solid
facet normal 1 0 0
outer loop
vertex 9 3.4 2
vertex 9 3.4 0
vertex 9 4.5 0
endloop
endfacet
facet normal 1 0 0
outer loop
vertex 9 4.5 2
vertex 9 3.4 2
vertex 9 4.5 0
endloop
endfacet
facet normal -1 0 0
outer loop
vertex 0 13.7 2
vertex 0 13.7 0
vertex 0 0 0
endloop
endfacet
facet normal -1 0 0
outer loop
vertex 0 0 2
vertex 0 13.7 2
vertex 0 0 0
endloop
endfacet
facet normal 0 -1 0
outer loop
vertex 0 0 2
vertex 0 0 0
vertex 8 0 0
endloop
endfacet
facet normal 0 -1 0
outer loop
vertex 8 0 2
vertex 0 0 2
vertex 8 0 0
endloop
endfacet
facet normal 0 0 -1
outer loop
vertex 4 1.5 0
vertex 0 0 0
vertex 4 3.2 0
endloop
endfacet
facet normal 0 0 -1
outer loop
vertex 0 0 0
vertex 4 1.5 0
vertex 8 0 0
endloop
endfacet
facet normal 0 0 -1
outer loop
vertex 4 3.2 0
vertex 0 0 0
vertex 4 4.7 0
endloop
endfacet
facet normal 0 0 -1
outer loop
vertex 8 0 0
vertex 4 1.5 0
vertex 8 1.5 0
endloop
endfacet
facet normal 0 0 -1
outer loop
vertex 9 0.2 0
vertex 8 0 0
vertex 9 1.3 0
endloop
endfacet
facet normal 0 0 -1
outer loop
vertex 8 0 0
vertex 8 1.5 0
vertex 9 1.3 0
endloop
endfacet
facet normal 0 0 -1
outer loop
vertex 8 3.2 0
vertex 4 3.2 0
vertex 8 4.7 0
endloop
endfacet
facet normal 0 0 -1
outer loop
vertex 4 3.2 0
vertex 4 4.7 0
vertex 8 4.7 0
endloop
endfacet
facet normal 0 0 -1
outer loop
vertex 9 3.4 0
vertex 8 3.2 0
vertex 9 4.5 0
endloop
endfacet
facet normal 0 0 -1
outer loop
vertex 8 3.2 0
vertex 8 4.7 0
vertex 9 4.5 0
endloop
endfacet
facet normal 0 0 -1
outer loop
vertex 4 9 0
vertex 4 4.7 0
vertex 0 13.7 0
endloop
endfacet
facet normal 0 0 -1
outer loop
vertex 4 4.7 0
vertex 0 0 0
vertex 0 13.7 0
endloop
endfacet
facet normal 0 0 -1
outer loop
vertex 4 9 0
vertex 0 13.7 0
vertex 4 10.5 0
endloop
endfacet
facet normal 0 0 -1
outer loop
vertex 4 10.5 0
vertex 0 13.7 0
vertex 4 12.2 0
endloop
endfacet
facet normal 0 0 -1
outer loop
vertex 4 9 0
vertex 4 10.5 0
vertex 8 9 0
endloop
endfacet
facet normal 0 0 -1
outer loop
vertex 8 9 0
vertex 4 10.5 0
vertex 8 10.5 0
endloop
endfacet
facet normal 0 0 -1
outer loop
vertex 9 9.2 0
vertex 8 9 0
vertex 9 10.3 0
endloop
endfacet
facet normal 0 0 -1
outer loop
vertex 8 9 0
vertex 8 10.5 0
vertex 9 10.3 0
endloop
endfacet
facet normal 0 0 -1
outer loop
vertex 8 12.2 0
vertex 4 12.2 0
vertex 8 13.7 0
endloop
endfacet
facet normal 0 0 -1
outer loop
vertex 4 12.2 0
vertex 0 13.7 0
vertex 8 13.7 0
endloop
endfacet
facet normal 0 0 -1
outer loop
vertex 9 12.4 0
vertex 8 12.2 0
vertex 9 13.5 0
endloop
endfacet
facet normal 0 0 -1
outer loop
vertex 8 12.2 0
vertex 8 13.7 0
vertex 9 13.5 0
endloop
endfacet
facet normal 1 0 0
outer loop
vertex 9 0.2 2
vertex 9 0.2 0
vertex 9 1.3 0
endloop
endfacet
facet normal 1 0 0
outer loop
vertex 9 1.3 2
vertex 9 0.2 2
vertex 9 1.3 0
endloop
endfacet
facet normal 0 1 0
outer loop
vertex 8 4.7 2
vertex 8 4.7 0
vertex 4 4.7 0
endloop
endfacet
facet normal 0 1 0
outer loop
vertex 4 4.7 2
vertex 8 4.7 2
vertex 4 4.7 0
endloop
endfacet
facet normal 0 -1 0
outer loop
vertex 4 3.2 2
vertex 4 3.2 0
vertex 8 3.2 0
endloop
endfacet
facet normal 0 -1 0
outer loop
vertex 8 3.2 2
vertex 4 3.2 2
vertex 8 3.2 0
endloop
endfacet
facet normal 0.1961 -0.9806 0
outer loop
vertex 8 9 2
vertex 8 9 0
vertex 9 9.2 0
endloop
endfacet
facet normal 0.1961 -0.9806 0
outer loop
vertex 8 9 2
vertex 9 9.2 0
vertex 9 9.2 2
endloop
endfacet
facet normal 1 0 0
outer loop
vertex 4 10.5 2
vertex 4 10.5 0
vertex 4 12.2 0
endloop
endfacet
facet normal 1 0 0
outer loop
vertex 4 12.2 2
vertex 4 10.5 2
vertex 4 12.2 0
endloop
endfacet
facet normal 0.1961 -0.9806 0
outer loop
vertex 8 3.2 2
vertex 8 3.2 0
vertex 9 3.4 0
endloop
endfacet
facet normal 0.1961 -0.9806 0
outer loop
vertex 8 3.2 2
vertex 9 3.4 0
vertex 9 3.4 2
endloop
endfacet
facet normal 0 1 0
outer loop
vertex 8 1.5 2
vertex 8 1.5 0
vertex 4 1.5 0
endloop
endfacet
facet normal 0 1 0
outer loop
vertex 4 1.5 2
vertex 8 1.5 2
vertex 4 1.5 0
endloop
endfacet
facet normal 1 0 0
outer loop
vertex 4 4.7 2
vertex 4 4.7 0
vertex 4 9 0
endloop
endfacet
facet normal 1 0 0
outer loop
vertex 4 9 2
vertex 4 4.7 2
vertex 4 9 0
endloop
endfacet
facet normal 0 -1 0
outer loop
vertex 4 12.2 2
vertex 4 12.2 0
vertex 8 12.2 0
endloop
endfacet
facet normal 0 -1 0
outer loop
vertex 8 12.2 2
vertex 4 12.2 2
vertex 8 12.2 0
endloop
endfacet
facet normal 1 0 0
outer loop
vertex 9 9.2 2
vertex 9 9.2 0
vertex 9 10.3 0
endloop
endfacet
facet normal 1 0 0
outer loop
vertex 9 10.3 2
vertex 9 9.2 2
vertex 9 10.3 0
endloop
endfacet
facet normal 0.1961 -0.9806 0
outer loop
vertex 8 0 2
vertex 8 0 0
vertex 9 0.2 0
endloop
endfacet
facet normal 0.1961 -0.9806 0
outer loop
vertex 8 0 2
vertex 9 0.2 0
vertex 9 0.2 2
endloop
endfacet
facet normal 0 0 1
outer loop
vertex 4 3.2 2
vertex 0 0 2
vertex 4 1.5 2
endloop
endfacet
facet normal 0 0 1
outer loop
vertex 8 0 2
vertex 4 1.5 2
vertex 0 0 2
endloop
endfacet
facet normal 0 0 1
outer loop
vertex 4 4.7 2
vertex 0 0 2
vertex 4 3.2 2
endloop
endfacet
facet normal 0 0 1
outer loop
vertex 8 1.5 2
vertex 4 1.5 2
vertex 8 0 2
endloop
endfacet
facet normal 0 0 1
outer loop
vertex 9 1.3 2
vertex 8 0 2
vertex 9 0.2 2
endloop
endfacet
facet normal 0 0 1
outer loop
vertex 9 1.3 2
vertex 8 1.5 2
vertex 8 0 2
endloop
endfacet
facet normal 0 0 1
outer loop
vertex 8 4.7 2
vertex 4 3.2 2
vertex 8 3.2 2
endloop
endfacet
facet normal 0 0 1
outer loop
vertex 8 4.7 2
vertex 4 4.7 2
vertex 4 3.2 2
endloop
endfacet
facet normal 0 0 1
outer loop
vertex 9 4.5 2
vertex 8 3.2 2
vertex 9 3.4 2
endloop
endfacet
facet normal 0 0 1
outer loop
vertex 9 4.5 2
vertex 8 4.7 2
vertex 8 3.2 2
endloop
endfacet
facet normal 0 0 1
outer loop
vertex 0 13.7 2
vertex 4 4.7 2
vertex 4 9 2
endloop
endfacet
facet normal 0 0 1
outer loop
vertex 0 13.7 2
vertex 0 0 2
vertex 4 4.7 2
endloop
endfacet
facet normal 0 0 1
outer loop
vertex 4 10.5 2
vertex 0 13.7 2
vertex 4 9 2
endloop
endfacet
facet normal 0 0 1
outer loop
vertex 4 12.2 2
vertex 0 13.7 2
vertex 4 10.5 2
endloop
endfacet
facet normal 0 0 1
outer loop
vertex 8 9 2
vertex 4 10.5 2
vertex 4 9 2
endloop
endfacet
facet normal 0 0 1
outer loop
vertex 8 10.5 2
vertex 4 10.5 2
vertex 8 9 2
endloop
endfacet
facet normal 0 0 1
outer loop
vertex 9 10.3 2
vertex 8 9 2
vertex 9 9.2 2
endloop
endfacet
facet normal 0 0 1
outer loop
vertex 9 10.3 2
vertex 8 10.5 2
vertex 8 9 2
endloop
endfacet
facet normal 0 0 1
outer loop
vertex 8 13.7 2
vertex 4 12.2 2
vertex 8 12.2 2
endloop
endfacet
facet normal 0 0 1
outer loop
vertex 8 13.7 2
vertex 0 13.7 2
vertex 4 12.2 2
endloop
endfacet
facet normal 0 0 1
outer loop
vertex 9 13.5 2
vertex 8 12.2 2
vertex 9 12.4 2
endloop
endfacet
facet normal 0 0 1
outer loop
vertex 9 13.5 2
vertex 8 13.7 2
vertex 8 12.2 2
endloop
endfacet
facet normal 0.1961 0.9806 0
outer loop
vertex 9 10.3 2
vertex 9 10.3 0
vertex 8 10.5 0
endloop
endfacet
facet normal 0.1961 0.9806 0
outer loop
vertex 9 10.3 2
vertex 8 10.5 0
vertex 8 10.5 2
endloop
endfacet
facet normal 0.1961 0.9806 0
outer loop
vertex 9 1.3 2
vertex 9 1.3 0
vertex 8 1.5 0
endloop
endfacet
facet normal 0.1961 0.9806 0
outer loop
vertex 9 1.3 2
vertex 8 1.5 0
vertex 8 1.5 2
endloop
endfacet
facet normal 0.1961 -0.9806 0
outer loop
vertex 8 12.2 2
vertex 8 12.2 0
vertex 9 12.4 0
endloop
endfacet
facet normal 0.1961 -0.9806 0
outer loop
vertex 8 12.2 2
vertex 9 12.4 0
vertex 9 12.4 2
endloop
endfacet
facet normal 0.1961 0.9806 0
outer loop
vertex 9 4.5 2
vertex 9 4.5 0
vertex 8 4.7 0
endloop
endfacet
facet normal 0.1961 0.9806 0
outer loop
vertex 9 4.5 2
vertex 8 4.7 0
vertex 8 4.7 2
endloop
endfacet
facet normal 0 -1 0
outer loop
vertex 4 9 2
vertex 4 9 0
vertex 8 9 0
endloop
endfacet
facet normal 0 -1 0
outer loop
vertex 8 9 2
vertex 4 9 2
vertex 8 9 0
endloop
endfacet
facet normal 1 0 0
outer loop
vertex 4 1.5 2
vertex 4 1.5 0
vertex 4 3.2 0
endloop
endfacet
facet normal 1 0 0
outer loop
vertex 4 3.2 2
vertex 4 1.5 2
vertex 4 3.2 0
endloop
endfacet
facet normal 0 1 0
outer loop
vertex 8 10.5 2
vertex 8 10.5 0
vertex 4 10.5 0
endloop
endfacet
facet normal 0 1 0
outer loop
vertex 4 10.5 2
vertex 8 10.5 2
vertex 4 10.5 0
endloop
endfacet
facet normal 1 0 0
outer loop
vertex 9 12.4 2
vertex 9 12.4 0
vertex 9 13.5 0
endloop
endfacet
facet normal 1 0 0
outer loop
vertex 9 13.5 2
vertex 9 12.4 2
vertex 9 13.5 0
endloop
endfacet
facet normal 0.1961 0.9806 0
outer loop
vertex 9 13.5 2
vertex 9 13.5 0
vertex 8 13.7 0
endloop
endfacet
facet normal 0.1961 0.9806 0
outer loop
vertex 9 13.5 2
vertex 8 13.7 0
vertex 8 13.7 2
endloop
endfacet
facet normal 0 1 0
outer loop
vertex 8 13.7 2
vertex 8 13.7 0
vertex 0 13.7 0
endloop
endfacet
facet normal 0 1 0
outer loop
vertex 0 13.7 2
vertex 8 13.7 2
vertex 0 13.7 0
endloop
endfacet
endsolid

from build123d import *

# Parameters (mm, degrees)
F1_DEPTH   = 2
F2_SIZE2   = 1
F2_SIZE    = 0.2
F2_2_SIZE2 = 1
F2_2_SIZE  = 0.2
F2_3_SIZE2 = 1
F2_3_SIZE  = 0.2
F2_4_SIZE2 = 1
F2_4_SIZE  = 0.2
F3_SIZE2   = 0.2
F3_SIZE    = 1
F3_2_SIZE2 = 0.2
F3_2_SIZE  = 1
F3_3_SIZE2 = 0.2
F3_3_SIZE  = 1
F3_4_SIZE2 = 0.2
F3_4_SIZE  = 1


with BuildPart() as f1:
    # F0 (on Top) → F1 (new body)
    with BuildSketch(Plane.XY):
        Polygon((0, 13.7), (0, 0), (9, 0), (9, 1.5), (4, 1.5), (4, 3.2), (9, 3.2), (9, 4.7), (4, 4.7), (4, 9), (9, 9), (9, 10.5), (4, 10.5), (4, 12.2), (9, 12.2), (9, 13.7), (4, 13.7), align=None)
    extrude(amount=F1_DEPTH)

    # F2
    f2_edges = [f1.edges().sort_by_distance(p)[0] for p in [
        (9, 12.2, 1),
    ]]
    f2_side = f1.faces().sort_by_distance((9, 12.95, 1))[0]
    chamfer(f2_edges, length=F2_SIZE, length2=F2_SIZE2, reference=f2_side)

    # F2#2
    f2_2_edges = [f1.edges().sort_by_distance(p)[0] for p in [
        (9, 9, 1),
    ]]
    f2_2_side = f1.faces().sort_by_distance((9, 9.75, 1))[0]
    chamfer(f2_2_edges, length=F2_2_SIZE, length2=F2_2_SIZE2, reference=f2_2_side)

    # F2#3
    f2_3_edges = [f1.edges().sort_by_distance(p)[0] for p in [
        (9, 3.2, 1),
    ]]
    f2_3_side = f1.faces().sort_by_distance((9, 3.95, 1))[0]
    chamfer(f2_3_edges, length=F2_3_SIZE, length2=F2_3_SIZE2, reference=f2_3_side)

    # F2#4
    f2_4_edges = [f1.edges().sort_by_distance(p)[0] for p in [
        (9, 0, 1),
    ]]
    f2_4_side = f1.faces().sort_by_distance((9, 0.75, 1))[0]
    chamfer(f2_4_edges, length=F2_4_SIZE, length2=F2_4_SIZE2, reference=f2_4_side)

    # F3
    f3_edges = [f1.edges().sort_by_distance(p)[0] for p in [
        (9, 10.5, 1),
    ]]
    f3_side = f1.faces().sort_by_distance((6.5, 10.5, 1))[0]
    chamfer(f3_edges, length=F3_SIZE, length2=F3_SIZE2, reference=f3_side)

    # F3#2
    f3_2_edges = [f1.edges().sort_by_distance(p)[0] for p in [
        (9, 4.7, 1),
    ]]
    f3_2_side = f1.faces().sort_by_distance((6.5, 4.7, 1))[0]
    chamfer(f3_2_edges, length=F3_2_SIZE, length2=F3_2_SIZE2, reference=f3_2_side)

    # F3#3
    f3_3_edges = [f1.edges().sort_by_distance(p)[0] for p in [
        (9, 1.5, 1),
    ]]
    f3_3_side = f1.faces().sort_by_distance((6.5, 1.5, 1))[0]
    chamfer(f3_3_edges, length=F3_3_SIZE, length2=F3_3_SIZE2, reference=f3_3_side)

    # F3#4
    f3_4_edges = [f1.edges().sort_by_distance(p)[0] for p in [
        (9, 13.7, 1),
    ]]
    f3_4_side = f1.faces().sort_by_distance((4.5, 13.7, 1))[0]
    chamfer(f3_4_edges, length=F3_4_SIZE, length2=F3_4_SIZE2, reference=f3_4_side)


solid = f1.part
